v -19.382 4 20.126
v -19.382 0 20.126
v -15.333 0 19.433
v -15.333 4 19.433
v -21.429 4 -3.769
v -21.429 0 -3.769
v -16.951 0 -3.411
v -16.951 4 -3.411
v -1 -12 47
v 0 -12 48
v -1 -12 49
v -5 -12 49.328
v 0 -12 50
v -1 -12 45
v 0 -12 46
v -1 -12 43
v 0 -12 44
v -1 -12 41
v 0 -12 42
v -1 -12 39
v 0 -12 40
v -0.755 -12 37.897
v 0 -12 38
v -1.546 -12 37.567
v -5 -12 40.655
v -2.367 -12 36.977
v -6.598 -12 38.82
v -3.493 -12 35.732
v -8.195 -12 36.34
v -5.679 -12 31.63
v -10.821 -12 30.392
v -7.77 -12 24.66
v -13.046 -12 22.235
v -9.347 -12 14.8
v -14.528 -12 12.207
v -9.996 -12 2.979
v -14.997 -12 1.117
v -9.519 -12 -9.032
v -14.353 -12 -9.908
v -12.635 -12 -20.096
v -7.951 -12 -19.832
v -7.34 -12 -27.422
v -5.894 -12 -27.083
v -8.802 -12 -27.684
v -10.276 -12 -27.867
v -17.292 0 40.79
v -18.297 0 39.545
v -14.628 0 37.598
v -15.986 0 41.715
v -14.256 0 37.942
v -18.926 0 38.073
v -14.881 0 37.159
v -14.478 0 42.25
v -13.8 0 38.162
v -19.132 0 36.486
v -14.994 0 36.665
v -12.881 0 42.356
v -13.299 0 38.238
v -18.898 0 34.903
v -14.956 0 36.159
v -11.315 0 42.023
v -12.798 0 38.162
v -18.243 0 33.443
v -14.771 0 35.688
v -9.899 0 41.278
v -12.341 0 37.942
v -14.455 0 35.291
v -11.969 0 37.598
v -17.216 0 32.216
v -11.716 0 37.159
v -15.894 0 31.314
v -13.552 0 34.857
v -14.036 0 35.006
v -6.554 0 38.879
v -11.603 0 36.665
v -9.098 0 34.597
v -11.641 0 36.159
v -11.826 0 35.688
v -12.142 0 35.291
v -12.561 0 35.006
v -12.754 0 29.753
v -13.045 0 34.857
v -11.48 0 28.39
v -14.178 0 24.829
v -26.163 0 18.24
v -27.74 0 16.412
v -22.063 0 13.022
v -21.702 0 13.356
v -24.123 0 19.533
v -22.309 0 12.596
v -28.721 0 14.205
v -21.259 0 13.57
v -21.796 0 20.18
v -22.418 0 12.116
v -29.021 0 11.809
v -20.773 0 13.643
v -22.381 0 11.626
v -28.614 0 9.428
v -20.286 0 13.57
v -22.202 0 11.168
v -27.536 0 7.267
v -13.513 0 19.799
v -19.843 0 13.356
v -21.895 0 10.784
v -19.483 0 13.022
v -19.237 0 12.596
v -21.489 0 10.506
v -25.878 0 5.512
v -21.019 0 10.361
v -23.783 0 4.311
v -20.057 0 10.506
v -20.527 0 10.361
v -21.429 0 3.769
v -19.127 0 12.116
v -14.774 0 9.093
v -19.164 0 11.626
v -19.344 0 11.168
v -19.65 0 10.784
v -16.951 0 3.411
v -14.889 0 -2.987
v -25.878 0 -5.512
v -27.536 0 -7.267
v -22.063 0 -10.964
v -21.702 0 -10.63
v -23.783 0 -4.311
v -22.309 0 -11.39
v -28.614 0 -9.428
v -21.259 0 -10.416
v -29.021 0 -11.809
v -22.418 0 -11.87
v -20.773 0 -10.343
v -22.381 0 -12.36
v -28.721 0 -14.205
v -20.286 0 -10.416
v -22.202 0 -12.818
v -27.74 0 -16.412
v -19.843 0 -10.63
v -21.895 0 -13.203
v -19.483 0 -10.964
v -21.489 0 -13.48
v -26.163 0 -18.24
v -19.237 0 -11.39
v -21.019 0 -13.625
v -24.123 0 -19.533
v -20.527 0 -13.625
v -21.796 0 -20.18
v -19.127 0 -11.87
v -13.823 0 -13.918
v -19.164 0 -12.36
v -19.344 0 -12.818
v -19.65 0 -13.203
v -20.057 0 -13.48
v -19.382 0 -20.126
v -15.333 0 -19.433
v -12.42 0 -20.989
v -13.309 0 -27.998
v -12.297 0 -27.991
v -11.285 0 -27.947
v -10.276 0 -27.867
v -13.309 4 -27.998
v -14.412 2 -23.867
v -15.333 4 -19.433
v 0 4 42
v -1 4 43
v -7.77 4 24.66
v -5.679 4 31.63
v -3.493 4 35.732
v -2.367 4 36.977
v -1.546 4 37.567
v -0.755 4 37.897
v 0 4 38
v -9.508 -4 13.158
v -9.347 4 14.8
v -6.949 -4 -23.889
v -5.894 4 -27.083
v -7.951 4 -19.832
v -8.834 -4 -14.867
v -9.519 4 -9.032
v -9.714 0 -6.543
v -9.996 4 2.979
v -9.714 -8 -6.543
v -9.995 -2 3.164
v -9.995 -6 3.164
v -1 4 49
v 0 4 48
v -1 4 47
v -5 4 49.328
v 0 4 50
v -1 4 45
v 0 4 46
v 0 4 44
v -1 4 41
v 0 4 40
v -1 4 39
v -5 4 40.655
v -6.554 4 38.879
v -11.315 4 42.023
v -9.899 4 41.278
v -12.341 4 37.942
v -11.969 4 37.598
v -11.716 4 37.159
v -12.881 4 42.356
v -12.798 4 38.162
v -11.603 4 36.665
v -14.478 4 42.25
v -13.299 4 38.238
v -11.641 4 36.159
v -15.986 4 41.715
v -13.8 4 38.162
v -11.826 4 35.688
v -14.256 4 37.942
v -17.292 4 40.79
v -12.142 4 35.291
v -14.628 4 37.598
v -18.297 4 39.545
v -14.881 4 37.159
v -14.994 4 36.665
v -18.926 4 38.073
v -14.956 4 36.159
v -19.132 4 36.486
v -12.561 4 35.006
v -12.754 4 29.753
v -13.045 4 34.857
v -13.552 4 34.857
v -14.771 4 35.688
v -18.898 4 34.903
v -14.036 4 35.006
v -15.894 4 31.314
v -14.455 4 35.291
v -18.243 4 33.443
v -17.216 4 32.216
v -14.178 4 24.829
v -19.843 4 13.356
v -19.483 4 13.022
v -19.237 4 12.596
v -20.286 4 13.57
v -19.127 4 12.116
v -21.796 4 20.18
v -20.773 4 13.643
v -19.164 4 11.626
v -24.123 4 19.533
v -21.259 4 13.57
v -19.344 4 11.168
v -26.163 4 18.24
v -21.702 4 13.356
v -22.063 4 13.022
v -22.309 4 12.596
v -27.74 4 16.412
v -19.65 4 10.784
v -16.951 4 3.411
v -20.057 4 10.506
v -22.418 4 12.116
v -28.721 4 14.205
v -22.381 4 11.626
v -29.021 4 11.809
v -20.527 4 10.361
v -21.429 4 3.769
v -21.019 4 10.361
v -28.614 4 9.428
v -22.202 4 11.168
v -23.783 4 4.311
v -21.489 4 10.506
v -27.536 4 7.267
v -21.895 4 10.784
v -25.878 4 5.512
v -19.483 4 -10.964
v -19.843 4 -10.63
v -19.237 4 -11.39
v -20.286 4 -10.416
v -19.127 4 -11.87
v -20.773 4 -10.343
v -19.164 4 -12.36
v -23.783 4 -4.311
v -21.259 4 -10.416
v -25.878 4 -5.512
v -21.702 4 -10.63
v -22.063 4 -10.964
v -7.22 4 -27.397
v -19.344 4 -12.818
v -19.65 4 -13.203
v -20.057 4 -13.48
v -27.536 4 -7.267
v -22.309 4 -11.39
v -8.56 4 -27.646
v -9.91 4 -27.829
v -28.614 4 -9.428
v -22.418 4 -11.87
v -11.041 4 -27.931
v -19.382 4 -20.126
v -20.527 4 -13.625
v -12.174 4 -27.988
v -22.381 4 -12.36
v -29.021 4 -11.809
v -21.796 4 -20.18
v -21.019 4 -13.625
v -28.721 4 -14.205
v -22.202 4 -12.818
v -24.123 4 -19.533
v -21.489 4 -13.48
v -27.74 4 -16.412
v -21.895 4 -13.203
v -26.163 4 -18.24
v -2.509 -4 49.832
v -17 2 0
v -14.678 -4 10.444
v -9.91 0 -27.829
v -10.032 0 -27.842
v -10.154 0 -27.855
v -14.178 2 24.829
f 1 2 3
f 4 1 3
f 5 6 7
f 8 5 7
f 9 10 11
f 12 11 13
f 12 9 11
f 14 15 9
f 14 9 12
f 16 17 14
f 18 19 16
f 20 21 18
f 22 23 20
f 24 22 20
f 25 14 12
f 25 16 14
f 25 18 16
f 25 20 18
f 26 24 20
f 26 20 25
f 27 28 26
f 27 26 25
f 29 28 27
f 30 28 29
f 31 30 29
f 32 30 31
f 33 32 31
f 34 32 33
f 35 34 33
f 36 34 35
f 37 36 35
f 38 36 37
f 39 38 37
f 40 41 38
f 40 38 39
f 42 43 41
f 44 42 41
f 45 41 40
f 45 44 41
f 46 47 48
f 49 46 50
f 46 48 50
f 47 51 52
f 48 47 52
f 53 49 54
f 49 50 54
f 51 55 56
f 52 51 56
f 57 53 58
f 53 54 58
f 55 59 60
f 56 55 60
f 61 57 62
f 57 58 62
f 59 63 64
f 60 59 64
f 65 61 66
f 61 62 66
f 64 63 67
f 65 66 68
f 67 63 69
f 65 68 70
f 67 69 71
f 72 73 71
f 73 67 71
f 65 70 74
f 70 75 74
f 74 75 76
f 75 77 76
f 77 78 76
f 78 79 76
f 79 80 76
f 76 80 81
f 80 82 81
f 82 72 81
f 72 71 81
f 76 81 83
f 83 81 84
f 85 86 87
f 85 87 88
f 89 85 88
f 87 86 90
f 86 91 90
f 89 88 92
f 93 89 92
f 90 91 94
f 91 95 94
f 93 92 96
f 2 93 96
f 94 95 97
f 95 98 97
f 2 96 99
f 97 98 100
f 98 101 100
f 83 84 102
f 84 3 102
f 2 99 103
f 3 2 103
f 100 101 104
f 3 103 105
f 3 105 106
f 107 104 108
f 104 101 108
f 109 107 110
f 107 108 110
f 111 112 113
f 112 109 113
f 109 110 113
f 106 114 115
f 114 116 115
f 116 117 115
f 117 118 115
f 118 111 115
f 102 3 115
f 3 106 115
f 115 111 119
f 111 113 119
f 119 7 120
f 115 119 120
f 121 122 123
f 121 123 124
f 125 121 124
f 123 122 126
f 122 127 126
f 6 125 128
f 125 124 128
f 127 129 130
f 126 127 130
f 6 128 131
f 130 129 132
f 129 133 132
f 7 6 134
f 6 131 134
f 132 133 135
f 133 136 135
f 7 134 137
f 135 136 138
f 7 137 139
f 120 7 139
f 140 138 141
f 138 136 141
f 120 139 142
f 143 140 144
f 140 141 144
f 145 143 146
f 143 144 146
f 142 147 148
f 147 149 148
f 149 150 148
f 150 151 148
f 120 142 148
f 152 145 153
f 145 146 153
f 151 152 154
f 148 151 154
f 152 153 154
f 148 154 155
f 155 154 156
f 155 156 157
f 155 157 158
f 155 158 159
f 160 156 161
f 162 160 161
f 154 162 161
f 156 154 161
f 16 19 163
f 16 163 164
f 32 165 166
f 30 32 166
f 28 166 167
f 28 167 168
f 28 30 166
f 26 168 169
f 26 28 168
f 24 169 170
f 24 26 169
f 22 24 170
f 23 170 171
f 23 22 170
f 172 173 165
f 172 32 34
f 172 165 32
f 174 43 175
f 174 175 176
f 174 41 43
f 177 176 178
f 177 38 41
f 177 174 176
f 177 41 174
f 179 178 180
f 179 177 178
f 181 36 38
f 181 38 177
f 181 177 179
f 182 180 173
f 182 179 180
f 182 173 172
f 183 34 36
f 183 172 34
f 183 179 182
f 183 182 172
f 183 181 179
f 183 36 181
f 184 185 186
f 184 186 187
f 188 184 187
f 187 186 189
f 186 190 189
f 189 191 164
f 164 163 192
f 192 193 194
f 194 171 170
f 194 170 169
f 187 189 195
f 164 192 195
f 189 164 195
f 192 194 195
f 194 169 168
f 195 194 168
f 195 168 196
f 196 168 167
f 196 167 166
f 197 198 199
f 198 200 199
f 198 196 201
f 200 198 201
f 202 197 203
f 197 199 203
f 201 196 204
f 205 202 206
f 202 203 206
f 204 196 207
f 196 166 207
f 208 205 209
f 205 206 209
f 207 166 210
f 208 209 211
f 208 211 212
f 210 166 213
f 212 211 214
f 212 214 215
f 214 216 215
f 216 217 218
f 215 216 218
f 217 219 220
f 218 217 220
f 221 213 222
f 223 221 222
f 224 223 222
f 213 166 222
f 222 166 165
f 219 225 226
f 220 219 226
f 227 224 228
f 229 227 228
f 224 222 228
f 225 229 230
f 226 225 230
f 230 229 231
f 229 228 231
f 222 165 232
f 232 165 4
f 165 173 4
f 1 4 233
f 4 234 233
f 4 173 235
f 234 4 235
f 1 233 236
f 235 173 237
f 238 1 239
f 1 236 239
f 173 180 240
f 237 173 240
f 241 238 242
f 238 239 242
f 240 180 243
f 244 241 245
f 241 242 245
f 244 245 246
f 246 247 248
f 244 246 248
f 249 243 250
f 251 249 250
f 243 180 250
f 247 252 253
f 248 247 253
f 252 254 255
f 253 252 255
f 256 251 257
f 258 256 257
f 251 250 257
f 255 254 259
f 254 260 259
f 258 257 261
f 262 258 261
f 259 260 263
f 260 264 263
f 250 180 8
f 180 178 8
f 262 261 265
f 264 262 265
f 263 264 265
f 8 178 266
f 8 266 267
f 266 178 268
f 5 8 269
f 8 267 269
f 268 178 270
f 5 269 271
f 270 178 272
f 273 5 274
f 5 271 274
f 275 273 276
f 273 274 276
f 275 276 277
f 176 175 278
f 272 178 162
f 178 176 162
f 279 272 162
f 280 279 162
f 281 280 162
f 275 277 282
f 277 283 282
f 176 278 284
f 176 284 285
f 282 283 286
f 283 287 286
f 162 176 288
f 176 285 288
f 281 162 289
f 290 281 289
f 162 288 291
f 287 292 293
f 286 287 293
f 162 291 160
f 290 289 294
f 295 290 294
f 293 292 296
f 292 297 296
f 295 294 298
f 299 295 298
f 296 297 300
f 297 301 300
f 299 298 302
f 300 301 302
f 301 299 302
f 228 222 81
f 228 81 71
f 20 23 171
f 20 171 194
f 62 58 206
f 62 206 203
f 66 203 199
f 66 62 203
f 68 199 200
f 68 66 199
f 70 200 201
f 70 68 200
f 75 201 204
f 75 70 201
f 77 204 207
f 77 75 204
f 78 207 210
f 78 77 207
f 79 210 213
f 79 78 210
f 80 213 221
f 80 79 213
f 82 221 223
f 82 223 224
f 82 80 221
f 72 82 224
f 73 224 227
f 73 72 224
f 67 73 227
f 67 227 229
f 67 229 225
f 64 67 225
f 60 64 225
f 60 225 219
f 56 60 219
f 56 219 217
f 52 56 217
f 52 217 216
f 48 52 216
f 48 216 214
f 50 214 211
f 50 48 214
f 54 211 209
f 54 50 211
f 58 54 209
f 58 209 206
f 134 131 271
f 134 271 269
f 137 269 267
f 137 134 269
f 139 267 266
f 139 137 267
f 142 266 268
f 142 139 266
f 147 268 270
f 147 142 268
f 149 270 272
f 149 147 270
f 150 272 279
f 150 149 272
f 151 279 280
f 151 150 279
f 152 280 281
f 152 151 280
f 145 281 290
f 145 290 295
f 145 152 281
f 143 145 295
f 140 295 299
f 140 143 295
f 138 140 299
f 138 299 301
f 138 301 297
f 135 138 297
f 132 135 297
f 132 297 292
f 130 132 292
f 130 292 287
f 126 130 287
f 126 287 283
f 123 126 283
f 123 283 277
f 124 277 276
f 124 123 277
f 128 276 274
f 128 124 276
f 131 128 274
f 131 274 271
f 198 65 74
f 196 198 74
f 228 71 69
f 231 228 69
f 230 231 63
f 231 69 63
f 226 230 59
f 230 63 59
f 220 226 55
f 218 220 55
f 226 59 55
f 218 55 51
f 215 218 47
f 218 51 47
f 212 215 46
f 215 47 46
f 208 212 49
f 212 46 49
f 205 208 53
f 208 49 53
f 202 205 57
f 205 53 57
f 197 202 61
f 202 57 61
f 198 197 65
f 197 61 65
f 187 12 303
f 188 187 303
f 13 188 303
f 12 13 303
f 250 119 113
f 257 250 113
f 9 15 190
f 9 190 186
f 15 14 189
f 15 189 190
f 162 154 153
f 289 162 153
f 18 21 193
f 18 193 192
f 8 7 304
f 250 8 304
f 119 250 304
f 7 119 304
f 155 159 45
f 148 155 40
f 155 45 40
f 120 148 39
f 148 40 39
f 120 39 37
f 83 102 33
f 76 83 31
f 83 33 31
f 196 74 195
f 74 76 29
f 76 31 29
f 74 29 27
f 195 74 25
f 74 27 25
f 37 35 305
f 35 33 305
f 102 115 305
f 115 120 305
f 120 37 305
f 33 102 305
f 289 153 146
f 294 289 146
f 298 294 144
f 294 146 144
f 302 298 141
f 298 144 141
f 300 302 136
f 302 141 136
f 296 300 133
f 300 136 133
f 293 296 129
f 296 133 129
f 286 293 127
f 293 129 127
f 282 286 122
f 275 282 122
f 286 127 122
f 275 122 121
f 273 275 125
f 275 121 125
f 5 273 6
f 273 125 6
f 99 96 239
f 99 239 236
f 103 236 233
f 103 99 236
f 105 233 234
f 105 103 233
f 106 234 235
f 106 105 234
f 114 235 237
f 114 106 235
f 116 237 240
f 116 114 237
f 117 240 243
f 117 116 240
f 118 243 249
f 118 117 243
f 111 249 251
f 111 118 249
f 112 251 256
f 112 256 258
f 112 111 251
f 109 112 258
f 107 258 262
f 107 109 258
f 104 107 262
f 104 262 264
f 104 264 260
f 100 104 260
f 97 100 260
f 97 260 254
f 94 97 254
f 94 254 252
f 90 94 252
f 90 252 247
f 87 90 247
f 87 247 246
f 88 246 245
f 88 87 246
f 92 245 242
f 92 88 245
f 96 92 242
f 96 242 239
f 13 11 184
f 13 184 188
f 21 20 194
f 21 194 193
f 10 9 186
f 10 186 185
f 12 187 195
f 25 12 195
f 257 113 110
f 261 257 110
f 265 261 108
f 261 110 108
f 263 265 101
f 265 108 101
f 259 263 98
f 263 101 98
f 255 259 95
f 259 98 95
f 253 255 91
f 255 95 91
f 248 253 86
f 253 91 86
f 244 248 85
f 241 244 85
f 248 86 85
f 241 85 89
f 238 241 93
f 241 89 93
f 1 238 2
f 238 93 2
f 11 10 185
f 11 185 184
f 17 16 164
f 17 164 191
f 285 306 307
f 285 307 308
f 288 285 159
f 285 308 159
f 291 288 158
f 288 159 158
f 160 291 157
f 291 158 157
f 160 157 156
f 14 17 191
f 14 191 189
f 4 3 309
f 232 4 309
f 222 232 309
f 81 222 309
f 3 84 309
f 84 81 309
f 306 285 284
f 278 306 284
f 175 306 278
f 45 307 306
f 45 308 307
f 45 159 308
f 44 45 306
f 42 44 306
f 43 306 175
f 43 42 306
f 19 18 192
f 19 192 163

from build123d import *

# Parameters (mm, degrees)
SKETCH_1_R      = 1.7
SKETCH_1_R_2    = 1.65
EXTRUDE_1_DEPTH = 4
EXTRUDE_START   = -16
EXTRUDE_2_DEPTH = 16


with BuildPart() as part:
    # Эскиз1 → Бобышка-Вытянуть1 (new body)
    with BuildSketch(Plane(origin=(0, 0, 0), x_dir=(1, 0, 0), z_dir=(0, 1, 0))):
        with BuildLine():
            Line((-9.899164468, -41.277955038), (-5.860900416, -38.382038285))
            add(Edge.make_bspline(
                [(-9.910314442, 27.829010819), (-20.588879158, -13.776681708), (-5.860900416, -38.382038285)],
                knots=[4.008501268, 4.008501268, 4.008501268, 5.815480813, 5.815480813, 5.815480813], degree=2, weights=[1, 0.618872556, 1]))
            ThreePointArc((-9.910314442, 27.829010819), (-11.606984575, 27.965326889), (-13.308802596, 27.998297108))
            add(Edge.make_bspline(
                [(-13.308802596, 27.998297108), (-14.503698084, 24.018467565), (-15.333061847, 19.433308827)],
                knots=[4.040859142, 4.040859142, 4.040859142, 4.265844637, 4.265844637, 4.265844637], degree=2, weights=[1, 0.993679361, 1]))
            Line((-15.333061847, 19.433308827), (-19.381931407, 20.125663445))
            ThreePointArc((-19.381931407, 20.125663445), (-28.959363457, 13.017768481), (-21.429274281, 3.768599193))
            Line((-21.429274281, 3.768599193), (-16.951090448, 3.411043825))
            add(Edge.make_bspline(
                [(-16.951090448, 3.411043825), (-17.049050673, 0), (-16.951090448, -3.411043825)],
                knots=[4.636515229, 4.636515229, 4.636515229, 4.788262732, 4.788262732, 4.788262732], degree=2, weights=[1, 0.997122968, 1]))
            Line((-16.951090448, -3.411043825), (-21.429274281, -3.768599193))
            ThreePointArc((-21.429274281, -3.768599193), (-28.959363457, -13.017768481), (-19.381931407, -20.125663445))
            Line((-19.381931407, -20.125663445), (-15.333061847, -19.433308827))
            add(Edge.make_bspline(
                [(-15.333061847, -19.433308827), (-14.314023938, -25.067085928), (-12.75383545, -29.753186253)],
                knots=[5.158933324, 5.158933324, 5.158933324, 5.434782065, 5.434782065, 5.434782065], degree=2, weights=[1, 0.990503503, 1]))
            Line((-12.75383545, -29.753186253), (-15.8942706, -31.313606592))
            ThreePointArc((-15.8942706, -31.313606592), (-18.296942807, -39.544856639), (-9.899164468, -41.277955038))
        make_face()
        with Locations(Location((-13.298587158, -36.537567928, 0), (0, 0, 270))):
            Circle(SKETCH_1_R, mode=Mode.SUBTRACT)
        with Locations(Location((-20.772601242, 11.993066919, 0), (0, 0, 270))):
            Circle(SKETCH_1_R_2, mode=Mode.SUBTRACT)
        with Locations(Location((-20.772601242, -11.993066919, 0), (0, 0, 270))):
            Circle(SKETCH_1_R_2, mode=Mode.SUBTRACT)
    extrude(amount=EXTRUDE_1_DEPTH)

    # Эскиз2 → Бобышка-Вытянуть2 (add)
    with BuildSketch(Plane(origin=(0, 4, 0), x_dir=(1, 0, 0), z_dir=(0, 1, 0)).offset(EXTRUDE_START)):
        with BuildLine():
            Line((-5, -49.327554721), (-5, -40.655170705))
            add(Edge.make_bspline(
                [(-10.276192518, 27.867200663), (-28.208103976, -18.227340182), (-5, -40.655170705)],
                knots=[3.896305482, 3.896305482, 3.896305482, 5.943348398, 5.943348398, 5.943348398], degree=2, weights=[1, 0.52036205, 1]))
            ThreePointArc((-10.276192518, 27.867200663), (-8.069315303, 27.562444529), (-5.893652235, 27.083201831))
            add(Edge.make_bspline(
                [(-5.893652235, 27.083201831), (-30.674811567, -38), (0, -38)],
                knots=[3.771865525, 3.771865525, 3.771865525, 6.283185307, 6.283185307, 6.283185307], degree=2, weights=[1, 0.309946191, 1]))
            Line((0, -38), (-1, -39))
            Line((-1, -39), (0, -40))
            Line((0, -40), (-1, -41))
            Line((-1, -41), (0, -42))
            Line((0, -42), (-1, -43))
            Line((-1, -43), (0, -44))
            Line((0, -44), (-1, -45))
            Line((-1, -45), (0, -46))
            Line((0, -46), (-1, -47))
            Line((-1, -47), (0, -48))
            Line((0, -48), (-1, -49))
            Line((-1, -49), (0, -50))
            add(Edge.make_bspline(
                [(-5, -49.327554721), (-2.517635123, -50), (0, -50)],
                knots=[2.974009186, 2.974009186, 2.974009186, 3.141592654, 3.141592654, 3.141592654], degree=2, weights=[1, 0.996491526, 1]))
        make_face()
    extrude(amount=EXTRUDE_2_DEPTH)


solid = part.part
